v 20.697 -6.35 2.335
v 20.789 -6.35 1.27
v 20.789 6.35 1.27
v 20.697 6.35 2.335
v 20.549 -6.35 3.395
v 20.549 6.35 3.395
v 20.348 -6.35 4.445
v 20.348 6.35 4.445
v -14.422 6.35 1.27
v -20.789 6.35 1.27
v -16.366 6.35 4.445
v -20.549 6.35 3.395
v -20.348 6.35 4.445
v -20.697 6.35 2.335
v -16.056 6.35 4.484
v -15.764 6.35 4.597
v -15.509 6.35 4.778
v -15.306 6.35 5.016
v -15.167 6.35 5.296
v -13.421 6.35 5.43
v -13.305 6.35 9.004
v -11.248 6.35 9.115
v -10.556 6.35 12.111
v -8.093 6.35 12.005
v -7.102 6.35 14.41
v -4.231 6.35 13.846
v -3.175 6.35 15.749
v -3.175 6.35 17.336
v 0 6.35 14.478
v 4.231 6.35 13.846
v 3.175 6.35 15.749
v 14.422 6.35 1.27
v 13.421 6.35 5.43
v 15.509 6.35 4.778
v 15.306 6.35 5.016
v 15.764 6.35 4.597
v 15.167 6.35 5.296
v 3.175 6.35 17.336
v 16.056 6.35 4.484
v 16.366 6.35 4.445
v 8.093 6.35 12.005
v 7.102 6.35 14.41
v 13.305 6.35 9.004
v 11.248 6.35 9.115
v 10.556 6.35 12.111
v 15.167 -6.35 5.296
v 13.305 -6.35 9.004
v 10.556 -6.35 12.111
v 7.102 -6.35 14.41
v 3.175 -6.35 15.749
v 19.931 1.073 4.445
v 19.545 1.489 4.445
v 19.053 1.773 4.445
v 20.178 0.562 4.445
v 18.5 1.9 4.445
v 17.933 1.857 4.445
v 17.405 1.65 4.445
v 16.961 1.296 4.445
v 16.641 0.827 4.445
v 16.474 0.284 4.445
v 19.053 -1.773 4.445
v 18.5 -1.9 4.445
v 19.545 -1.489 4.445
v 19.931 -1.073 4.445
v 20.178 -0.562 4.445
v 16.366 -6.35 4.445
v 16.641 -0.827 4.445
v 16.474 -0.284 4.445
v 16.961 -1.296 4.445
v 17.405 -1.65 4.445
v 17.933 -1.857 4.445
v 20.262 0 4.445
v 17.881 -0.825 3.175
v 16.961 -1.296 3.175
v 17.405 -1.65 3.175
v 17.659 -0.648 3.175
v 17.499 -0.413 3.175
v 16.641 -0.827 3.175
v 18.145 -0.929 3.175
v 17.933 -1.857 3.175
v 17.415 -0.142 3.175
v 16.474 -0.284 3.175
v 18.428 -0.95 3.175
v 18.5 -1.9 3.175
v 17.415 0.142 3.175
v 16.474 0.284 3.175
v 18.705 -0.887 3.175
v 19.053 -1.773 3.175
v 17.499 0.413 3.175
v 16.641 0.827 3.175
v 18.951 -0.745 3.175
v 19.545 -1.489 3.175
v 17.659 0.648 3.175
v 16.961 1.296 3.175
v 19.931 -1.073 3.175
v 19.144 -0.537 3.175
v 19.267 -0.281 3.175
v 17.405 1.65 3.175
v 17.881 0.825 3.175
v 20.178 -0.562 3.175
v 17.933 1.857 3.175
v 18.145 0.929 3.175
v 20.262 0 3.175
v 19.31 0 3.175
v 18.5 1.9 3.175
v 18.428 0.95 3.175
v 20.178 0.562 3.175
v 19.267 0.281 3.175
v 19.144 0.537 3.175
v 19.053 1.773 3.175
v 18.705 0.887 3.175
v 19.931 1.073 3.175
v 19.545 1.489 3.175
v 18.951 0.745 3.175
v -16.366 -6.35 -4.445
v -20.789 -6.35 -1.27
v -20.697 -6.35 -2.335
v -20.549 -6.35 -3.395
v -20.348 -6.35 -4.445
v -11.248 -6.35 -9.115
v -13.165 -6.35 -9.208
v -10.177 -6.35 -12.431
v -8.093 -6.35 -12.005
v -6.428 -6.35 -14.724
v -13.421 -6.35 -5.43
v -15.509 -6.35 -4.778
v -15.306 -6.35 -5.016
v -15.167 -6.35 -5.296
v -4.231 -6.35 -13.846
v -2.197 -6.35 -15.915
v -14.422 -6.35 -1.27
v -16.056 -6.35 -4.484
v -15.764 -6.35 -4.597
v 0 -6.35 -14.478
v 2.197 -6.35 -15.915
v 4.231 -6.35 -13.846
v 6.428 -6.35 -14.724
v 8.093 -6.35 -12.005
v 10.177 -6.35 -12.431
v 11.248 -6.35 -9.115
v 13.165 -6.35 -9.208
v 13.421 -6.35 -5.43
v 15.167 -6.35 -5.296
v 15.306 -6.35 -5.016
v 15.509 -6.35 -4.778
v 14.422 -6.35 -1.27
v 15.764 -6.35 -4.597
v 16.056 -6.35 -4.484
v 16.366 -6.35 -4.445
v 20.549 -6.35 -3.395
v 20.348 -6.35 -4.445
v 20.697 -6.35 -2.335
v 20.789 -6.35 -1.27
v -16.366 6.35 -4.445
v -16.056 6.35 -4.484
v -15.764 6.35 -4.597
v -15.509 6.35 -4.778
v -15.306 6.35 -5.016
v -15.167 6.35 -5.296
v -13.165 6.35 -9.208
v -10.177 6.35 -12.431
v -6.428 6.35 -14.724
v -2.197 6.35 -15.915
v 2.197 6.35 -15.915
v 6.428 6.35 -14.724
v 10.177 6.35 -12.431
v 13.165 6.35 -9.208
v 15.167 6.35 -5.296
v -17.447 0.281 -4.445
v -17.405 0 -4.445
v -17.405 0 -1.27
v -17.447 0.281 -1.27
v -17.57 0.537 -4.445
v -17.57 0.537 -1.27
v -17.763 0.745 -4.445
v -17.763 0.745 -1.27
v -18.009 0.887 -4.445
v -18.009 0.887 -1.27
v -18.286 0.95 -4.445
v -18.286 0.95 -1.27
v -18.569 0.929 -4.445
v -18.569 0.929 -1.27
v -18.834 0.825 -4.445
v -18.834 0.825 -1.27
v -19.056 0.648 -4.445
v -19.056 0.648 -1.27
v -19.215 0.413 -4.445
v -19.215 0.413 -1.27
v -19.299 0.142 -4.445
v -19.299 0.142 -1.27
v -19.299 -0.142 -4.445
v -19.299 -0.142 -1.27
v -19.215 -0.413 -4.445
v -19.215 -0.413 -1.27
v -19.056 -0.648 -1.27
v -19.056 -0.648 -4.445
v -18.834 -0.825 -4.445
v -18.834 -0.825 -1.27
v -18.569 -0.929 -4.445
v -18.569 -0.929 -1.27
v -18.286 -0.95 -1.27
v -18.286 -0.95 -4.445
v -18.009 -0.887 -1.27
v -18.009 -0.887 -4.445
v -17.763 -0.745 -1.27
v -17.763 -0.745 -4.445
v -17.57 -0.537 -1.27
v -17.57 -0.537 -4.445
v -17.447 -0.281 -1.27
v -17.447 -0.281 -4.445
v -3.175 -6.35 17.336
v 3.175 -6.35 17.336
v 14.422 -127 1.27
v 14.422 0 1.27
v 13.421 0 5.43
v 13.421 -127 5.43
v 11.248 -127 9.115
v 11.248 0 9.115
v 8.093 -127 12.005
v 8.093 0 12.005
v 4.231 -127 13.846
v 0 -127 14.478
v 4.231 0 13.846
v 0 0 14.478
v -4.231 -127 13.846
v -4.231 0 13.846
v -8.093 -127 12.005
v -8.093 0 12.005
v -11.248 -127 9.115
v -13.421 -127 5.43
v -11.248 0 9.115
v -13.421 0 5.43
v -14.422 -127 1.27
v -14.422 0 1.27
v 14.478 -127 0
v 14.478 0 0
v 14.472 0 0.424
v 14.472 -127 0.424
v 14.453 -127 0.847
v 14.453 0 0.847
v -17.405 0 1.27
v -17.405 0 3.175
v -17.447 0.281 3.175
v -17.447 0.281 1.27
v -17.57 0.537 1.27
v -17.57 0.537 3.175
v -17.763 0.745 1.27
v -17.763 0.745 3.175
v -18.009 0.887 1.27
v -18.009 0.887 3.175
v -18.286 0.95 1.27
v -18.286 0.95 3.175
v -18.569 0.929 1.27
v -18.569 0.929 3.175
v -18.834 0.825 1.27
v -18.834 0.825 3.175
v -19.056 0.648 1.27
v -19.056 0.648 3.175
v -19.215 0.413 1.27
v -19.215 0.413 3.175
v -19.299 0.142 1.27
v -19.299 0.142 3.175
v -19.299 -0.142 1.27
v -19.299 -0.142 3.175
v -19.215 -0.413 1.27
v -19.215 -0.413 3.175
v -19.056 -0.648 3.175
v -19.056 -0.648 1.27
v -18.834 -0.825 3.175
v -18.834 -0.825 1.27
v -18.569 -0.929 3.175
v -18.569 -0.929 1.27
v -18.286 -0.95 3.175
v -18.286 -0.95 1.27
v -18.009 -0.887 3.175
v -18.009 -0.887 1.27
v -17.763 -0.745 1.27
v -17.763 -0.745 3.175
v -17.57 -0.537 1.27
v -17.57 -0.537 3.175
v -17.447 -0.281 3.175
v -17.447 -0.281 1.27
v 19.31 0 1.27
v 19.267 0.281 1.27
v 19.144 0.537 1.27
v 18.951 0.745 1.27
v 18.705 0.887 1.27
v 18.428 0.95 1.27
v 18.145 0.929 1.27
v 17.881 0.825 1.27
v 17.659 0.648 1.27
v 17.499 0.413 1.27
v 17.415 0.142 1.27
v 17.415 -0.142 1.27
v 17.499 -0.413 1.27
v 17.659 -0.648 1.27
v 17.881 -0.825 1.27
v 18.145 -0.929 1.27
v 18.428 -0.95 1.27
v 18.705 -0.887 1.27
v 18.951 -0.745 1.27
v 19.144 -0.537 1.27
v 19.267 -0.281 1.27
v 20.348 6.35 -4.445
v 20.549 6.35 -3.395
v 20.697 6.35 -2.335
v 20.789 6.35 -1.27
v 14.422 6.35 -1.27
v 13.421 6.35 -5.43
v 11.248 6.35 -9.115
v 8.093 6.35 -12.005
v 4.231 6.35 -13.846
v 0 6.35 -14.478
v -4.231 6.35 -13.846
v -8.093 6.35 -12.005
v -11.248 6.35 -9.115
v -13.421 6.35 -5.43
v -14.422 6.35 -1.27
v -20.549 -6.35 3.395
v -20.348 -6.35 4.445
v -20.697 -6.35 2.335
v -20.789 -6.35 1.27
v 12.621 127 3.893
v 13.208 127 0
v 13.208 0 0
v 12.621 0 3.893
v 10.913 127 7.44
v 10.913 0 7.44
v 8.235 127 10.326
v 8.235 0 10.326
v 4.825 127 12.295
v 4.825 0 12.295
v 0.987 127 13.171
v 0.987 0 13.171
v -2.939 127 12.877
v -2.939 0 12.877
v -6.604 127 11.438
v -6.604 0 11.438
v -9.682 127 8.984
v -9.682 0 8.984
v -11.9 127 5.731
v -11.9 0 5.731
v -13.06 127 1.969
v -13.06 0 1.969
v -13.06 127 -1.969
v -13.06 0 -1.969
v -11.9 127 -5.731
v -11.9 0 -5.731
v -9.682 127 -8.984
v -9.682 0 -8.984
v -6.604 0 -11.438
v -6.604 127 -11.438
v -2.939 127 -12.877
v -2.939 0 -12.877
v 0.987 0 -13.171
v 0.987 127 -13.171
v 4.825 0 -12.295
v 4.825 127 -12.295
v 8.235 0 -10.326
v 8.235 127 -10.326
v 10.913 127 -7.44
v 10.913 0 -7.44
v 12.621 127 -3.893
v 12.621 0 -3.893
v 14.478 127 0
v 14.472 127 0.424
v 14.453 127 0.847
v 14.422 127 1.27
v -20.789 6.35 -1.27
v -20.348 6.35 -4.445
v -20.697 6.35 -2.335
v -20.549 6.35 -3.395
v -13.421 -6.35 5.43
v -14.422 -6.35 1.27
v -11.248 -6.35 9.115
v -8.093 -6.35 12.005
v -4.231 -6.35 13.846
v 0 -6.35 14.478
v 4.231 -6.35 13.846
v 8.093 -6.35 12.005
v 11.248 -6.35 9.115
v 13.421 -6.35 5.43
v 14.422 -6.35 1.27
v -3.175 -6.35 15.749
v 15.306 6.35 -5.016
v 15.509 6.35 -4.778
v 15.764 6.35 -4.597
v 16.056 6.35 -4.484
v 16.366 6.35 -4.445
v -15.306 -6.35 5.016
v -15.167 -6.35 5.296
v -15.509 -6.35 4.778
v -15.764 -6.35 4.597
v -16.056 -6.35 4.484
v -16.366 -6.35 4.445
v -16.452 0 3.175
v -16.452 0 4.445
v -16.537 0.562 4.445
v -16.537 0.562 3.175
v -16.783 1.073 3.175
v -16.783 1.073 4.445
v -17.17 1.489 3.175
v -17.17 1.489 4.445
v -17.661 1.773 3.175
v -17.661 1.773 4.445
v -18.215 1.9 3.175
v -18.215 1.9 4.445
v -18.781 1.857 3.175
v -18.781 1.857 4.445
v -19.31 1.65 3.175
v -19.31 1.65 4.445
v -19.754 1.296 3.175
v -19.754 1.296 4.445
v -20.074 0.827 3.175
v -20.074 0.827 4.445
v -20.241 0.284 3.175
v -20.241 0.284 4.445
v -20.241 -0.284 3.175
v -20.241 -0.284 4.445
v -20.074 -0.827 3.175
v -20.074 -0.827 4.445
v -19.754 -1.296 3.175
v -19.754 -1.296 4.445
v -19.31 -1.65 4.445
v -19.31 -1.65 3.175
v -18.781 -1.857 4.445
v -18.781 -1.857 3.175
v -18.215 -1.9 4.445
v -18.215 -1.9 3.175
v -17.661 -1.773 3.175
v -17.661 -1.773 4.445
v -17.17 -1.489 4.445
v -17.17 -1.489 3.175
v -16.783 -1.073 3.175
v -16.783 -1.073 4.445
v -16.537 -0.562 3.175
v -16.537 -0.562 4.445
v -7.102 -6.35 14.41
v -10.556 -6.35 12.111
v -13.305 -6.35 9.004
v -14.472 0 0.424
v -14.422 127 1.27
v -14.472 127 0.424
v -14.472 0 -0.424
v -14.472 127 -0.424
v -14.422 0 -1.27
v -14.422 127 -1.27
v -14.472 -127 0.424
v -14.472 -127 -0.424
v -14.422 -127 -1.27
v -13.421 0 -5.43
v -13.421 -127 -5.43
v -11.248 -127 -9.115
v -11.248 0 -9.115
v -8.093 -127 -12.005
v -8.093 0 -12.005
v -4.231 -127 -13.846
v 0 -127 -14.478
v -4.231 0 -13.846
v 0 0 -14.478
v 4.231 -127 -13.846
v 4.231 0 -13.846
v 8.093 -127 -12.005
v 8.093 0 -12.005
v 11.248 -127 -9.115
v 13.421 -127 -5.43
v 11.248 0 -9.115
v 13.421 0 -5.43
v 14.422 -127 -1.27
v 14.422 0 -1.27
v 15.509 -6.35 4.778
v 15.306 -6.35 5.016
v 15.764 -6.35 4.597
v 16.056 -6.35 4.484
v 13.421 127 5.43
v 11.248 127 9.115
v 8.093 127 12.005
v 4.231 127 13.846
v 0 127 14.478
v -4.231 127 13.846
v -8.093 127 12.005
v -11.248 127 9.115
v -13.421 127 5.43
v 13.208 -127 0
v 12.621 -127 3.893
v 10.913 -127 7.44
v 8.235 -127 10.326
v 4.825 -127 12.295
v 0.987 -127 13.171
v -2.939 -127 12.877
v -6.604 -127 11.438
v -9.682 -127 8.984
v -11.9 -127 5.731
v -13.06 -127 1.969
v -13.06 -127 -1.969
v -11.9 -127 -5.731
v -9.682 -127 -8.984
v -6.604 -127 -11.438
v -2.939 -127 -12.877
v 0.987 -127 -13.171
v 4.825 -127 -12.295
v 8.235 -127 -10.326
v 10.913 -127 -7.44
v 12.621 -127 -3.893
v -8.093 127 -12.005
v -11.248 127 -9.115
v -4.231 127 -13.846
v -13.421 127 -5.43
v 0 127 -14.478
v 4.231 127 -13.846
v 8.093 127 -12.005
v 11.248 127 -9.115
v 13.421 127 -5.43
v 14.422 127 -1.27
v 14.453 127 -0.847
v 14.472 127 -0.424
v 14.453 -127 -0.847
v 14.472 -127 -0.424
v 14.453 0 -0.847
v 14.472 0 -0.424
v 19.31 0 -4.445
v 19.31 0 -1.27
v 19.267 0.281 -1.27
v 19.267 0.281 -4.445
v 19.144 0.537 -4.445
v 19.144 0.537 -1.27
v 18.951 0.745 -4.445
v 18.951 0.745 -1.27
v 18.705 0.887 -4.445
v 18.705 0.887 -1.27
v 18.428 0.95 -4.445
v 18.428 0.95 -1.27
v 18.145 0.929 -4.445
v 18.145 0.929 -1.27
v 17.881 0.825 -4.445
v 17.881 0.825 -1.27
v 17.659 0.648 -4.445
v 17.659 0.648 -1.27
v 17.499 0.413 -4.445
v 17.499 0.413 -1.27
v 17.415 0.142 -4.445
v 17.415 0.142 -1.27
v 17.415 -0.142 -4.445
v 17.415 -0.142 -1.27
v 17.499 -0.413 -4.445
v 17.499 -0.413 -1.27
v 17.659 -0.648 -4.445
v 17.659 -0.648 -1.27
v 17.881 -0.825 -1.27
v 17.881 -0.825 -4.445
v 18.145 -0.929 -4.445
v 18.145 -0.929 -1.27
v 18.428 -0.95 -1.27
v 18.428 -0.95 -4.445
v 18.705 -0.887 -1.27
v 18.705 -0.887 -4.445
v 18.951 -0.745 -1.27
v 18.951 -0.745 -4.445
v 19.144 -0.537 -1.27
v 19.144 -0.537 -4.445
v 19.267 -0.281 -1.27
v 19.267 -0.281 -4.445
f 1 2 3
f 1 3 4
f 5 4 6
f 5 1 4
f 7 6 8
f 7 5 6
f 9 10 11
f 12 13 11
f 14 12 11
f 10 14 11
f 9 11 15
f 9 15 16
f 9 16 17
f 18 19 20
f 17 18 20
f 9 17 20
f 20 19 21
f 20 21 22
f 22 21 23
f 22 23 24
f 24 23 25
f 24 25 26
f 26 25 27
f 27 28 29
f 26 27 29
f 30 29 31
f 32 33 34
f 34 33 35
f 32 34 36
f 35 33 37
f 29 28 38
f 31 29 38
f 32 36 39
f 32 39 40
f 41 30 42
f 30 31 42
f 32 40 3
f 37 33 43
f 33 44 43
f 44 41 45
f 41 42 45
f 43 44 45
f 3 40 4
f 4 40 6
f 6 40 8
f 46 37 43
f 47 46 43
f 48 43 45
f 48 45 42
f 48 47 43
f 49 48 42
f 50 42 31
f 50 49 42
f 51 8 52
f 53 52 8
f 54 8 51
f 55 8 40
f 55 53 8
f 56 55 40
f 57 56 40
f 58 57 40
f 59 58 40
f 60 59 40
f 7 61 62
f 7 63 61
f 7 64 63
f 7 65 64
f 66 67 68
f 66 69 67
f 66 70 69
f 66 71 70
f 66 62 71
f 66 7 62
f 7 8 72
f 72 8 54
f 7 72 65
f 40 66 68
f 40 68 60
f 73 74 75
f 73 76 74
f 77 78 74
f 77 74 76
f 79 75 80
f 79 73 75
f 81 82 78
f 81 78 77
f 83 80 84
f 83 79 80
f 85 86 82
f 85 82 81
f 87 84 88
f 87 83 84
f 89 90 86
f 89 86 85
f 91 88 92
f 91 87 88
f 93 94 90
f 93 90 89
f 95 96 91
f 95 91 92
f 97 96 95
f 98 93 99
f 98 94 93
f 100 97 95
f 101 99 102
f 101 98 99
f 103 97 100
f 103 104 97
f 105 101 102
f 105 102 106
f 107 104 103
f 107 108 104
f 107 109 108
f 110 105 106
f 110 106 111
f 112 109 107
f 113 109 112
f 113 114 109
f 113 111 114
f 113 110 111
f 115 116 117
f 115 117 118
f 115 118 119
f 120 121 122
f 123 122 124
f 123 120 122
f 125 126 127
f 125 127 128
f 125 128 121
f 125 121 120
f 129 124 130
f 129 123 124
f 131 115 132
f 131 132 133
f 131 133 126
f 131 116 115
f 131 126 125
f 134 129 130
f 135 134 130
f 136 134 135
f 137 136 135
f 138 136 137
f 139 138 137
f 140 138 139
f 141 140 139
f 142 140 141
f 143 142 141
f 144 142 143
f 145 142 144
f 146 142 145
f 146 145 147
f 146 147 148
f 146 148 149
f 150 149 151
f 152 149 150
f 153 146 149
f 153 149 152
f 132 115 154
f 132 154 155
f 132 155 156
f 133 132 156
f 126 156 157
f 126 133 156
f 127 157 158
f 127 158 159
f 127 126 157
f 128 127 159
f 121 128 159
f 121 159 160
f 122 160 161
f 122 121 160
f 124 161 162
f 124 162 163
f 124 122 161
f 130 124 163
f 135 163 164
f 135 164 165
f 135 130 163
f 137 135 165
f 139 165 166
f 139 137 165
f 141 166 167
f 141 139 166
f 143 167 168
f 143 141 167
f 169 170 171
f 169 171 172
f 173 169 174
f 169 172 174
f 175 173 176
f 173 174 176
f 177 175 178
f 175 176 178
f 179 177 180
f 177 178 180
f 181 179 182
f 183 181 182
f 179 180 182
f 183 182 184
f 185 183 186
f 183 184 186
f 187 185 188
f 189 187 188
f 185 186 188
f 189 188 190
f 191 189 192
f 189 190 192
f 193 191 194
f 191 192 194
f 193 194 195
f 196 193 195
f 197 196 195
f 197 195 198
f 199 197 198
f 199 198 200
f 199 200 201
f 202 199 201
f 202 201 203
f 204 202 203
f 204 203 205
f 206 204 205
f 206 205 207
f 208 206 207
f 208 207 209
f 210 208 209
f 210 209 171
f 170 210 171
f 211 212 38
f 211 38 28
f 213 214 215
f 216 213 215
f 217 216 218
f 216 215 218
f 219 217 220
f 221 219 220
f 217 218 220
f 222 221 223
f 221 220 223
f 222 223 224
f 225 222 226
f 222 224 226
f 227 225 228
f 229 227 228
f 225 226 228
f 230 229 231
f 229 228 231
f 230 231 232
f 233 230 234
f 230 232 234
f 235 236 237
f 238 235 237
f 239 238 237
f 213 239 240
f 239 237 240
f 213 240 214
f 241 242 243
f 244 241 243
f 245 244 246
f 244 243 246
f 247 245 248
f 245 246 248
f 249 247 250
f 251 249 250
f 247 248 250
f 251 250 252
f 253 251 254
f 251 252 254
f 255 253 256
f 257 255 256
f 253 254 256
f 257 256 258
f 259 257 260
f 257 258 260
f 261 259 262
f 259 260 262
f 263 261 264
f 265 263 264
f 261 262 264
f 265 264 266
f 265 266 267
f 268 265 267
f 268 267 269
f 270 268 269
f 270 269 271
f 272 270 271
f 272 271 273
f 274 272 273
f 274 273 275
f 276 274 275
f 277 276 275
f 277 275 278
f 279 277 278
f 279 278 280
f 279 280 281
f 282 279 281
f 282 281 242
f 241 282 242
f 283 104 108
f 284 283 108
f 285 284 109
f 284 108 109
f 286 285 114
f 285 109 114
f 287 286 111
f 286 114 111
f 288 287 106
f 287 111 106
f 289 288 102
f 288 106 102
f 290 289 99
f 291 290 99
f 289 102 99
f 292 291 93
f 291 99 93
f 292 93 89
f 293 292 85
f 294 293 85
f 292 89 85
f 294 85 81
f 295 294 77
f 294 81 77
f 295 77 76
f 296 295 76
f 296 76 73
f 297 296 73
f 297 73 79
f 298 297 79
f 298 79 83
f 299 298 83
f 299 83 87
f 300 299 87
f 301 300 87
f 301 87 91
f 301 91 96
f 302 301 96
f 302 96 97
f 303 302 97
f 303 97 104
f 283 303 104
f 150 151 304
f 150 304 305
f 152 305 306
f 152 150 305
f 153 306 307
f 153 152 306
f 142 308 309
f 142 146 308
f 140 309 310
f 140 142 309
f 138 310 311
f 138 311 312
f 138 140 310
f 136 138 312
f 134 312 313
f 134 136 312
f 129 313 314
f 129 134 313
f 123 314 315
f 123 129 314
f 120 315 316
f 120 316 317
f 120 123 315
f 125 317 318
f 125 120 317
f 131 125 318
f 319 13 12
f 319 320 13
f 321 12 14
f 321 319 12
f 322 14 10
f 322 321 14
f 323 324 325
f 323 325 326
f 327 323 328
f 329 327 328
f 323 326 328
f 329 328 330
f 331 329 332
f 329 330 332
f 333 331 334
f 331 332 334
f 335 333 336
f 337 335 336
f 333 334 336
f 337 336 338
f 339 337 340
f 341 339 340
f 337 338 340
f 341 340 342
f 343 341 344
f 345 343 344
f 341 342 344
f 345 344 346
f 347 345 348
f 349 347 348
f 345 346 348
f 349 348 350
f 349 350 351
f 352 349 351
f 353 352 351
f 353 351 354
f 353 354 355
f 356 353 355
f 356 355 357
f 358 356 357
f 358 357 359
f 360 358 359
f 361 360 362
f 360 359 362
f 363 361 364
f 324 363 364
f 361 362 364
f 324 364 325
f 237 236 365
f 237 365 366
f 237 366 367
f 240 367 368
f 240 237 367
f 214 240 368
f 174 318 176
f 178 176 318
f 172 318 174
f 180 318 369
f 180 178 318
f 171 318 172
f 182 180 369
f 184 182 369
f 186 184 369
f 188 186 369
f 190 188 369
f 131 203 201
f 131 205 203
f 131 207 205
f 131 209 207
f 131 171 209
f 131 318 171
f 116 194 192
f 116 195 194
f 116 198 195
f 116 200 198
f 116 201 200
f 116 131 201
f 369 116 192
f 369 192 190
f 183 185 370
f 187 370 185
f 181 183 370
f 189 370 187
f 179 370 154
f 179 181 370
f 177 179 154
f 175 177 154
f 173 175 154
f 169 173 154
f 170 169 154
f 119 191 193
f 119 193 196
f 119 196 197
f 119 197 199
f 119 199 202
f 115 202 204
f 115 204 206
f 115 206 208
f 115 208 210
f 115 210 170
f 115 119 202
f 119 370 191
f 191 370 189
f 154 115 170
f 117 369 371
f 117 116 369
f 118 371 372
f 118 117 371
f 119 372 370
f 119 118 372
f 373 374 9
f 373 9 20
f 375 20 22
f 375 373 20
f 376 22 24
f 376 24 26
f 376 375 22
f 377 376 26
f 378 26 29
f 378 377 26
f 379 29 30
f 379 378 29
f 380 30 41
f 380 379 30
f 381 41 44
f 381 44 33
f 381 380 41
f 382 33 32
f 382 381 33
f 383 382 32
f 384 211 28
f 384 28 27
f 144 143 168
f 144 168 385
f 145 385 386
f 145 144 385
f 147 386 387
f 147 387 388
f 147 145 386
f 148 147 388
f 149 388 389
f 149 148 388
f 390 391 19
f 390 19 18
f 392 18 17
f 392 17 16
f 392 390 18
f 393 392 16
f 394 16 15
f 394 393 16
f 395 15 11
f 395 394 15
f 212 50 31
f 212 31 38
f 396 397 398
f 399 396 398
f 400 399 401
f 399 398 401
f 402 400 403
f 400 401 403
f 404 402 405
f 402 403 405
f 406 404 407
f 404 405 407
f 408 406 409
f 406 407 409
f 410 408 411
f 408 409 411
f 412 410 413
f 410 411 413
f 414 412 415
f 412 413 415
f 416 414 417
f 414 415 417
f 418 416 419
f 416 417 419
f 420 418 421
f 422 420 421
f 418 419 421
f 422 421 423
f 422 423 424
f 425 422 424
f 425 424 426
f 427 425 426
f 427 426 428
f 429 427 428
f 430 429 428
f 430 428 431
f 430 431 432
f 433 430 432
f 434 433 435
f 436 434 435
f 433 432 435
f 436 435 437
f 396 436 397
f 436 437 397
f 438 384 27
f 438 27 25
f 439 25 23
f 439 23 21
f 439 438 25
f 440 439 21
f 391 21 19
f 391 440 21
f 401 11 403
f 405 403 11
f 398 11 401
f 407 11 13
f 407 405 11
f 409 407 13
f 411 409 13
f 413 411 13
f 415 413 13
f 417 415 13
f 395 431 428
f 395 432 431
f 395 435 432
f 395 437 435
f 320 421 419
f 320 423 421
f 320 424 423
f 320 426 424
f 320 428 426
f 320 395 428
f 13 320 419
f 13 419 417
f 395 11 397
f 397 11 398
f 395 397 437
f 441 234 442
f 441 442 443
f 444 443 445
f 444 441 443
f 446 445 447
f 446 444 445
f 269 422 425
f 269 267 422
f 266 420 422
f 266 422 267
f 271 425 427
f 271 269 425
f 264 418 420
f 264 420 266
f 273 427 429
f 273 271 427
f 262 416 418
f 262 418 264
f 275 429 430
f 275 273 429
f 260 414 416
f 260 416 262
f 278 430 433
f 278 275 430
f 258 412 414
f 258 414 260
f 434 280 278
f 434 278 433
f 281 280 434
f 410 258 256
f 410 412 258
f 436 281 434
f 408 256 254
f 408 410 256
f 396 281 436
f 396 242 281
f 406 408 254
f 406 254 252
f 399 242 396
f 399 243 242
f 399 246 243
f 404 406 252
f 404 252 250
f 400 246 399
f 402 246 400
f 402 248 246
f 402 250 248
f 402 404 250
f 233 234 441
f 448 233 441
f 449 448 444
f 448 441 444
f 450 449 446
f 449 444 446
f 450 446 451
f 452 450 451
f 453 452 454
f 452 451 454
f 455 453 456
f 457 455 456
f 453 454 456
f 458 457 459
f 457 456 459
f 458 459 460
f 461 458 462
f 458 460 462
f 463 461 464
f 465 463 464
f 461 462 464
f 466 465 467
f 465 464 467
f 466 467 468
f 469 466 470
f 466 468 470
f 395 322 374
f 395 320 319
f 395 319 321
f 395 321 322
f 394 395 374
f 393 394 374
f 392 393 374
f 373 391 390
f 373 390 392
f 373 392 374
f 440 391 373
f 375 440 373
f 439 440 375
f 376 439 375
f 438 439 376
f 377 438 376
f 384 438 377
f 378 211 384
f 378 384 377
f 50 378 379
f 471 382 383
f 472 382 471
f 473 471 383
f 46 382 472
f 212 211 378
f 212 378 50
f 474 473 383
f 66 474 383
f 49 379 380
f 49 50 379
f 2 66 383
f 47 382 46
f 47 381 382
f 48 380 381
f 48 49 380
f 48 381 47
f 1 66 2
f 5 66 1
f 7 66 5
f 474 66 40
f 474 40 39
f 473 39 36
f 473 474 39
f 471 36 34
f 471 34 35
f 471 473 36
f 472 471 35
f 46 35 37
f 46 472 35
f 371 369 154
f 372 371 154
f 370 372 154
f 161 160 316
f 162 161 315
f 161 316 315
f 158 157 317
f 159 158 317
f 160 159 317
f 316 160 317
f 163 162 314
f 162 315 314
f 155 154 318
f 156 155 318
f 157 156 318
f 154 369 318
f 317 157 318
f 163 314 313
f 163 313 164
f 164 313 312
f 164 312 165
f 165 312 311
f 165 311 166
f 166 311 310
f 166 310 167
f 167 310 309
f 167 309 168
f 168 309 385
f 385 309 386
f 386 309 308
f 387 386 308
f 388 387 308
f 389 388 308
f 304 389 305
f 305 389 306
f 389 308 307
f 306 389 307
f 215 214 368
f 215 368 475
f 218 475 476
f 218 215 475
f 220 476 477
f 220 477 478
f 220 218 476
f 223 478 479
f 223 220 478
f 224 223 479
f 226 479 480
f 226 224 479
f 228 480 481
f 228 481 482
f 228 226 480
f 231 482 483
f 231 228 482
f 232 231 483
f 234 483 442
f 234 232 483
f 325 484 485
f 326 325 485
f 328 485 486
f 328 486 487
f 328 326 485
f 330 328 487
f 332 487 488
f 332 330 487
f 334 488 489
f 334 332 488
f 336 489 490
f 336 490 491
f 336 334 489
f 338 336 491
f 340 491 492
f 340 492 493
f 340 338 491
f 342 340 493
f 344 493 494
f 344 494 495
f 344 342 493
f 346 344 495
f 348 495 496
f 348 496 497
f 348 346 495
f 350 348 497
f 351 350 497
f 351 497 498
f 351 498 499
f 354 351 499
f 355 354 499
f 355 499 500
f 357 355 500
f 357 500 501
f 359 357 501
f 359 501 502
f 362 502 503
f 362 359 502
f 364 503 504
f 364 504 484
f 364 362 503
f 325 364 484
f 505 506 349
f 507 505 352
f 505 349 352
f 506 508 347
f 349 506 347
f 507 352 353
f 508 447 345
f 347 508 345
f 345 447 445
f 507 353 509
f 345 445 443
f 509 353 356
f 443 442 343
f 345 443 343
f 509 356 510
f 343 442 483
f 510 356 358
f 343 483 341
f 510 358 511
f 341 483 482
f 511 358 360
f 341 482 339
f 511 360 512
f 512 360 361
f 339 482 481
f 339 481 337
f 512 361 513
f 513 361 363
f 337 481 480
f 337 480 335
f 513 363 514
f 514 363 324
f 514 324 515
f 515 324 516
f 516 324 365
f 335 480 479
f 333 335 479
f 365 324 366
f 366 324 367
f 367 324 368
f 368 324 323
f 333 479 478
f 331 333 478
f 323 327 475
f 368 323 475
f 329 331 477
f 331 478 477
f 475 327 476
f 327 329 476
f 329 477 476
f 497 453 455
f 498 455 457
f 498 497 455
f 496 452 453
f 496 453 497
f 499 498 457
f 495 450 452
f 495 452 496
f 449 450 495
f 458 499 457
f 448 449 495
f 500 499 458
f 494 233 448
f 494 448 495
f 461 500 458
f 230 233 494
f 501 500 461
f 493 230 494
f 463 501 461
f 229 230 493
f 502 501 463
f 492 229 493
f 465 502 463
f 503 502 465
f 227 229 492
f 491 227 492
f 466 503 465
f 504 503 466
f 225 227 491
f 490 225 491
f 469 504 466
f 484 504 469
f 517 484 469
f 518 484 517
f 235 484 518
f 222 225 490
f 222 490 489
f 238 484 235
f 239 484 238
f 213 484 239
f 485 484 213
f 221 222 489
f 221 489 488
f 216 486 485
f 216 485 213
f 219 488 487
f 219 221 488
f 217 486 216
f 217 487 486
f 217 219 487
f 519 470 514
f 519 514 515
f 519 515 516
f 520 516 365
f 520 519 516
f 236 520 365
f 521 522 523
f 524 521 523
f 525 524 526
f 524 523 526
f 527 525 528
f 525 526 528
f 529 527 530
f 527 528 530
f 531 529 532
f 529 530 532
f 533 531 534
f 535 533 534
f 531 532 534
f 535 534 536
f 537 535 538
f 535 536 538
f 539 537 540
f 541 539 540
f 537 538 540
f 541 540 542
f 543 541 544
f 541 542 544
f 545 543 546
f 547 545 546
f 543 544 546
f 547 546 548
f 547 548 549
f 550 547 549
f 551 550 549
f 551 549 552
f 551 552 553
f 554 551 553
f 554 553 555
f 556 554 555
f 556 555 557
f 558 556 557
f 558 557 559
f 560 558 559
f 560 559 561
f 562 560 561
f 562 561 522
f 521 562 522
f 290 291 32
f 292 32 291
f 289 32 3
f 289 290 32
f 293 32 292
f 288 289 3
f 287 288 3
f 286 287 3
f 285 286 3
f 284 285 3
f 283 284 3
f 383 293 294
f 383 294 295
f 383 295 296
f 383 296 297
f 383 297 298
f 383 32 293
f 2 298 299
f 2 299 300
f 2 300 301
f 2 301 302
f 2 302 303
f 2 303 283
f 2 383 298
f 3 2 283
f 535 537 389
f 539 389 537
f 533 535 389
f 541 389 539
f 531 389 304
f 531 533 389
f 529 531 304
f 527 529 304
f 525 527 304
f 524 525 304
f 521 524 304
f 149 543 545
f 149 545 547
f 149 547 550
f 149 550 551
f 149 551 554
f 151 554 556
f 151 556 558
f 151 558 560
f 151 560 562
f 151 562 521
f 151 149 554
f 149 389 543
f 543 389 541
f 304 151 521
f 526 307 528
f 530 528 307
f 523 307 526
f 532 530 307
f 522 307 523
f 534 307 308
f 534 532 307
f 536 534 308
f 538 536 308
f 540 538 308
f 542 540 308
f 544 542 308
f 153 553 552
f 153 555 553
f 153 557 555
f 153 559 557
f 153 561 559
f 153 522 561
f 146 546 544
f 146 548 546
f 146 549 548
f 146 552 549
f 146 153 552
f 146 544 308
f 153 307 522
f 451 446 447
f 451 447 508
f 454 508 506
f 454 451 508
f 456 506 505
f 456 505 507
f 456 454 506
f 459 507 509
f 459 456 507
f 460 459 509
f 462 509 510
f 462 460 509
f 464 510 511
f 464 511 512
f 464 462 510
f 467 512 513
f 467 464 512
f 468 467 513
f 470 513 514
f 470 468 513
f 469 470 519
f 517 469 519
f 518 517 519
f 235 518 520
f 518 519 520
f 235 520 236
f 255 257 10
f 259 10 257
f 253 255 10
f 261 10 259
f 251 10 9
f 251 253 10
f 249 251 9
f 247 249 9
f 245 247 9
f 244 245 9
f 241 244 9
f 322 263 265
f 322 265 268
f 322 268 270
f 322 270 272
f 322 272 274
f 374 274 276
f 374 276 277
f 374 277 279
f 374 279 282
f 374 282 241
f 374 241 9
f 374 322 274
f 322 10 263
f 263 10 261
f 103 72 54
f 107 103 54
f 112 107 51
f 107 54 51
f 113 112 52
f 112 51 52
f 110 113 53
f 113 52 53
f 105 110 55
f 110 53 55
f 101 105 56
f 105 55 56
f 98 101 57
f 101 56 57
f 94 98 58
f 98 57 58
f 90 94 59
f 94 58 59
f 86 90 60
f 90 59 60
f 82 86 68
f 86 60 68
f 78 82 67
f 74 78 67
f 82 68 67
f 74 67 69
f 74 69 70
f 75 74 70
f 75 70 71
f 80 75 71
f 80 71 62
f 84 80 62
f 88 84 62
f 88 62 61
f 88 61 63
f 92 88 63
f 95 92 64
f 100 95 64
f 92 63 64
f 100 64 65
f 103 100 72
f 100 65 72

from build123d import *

# Parameters (mm, degrees)
F0_R     = 13.208
F1_DEPTH = 127
F2_DEPTH = 6.35
F3_R     = 0.9525
F4_R     = 0.9525
F5_DEPTH = 25.4
F3_R_2   = 1.905
F4_R_2   = 1.905
F6_DEPTH = 1.27


with BuildPart() as f1:
    # F0 (on Front) → F1 (new body, symmetric)
    with BuildSketch(Plane.XZ):
        with BuildLine():
            ThreePointArc((14.4221906796, -1.27), (14.4640409406, -0.6356128303), (14.478, 0))
            ThreePointArc((14.478, 0), (14.4640409406, 0.6356128303), (14.4221906796, 1.27))
            ThreePointArc((14.4221906796, 1.27), (0, 14.478), (-14.4221906796, 1.27))
            ThreePointArc((-14.4221906796, 1.27), (-14.478, 0), (-14.4221906796, -1.27))
            ThreePointArc((-14.4221906796, -1.27), (0, -14.478), (14.4221906796, -1.27))
        make_face()
        Circle(F0_R, mode=Mode.SUBTRACT)
    extrude(amount=F1_DEPTH, both=True)


with BuildPart() as f2:
    # F0 (on Front) → F2 (new body, symmetric)
    with BuildSketch(Plane.XZ):
        with BuildLine():
            Line((-20.7892444307, 1.27), (-16.0152237028, 1.27))
            ThreePointArc((-16.0152237028, 1.27), (-15.8067006229, 2.8720211817), (-15.4383375157, 4.445))
            Line((-15.4383375157, 4.445), (-16.3663781959, 4.445))
            Line((-16.3663781959, 4.445), (-20.3481586145, 4.445))
            ThreePointArc((-20.3481586145, 4.445), (-20.6298724808, 2.865998155), (-20.7892444307, 1.27))
        make_face()
        with BuildLine():
            Line((-16.0152237028, 1.27), (-15.4383375157, 1.27))
            Line((-15.4383375157, 1.27), (-15.4383375157, 4.445))
            ThreePointArc((-15.4383375157, 4.445), (-15.8067006229, 2.8720211817), (-16.0152237028, 1.27))
        make_face()
        with BuildLine():
            Line((-16.3663781959, 4.445), (-15.4383375157, 4.445))
            ThreePointArc((-15.4383375157, 4.445), (-15.3087756792, 4.8725432223), (-15.1673761286, 5.2963186859))
            ThreePointArc((-15.1673761286, 5.2963186859), (-15.63113173, 4.679474706), (-16.3663781959, 4.445))
        make_face()
        with BuildLine():
            ThreePointArc((-14.4221906796, 1.27), (0, 14.478), (14.4221906796, 1.27))
            Line((14.4221906796, 1.27), (15.4383375157, 1.27))
            Line((15.4383375157, 1.27), (15.4383375157, 4.445))
            ThreePointArc((15.4383375157, 4.445), (15.3087756893, 4.8725431908), (15.1673761504, 5.2963186234))
            ThreePointArc((15.1673761504, 5.2963186234), (10.5557305202, 12.1110215686), (3.175, 15.748640108))
            Line((3.175, 15.748640108), (3.175, 14.7955))
            Line((3.175, 14.7955), (-3.175, 14.7955))
            Line((-3.175, 14.7955), (-3.175, 15.748640108))
            ThreePointArc((-3.175, 15.748640108), (-10.5557304953, 12.1110215903), (-15.1673761286, 5.2963186859))
            ThreePointArc((-15.1673761286, 5.2963186859), (-15.3087756792, 4.8725432223), (-15.4383375157, 4.445))
            Line((-15.4383375157, 4.445), (-15.4383375157, 1.27))
            Line((-15.4383375157, 1.27), (-14.4221906796, 1.27))
        make_face()
        with BuildLine():
            Line((15.4383375157, 4.445), (15.4383375157, 1.27))
            Line((15.4383375157, 1.27), (16.0152237028, 1.27))
            ThreePointArc((16.0152237028, 1.27), (15.8067006229, 2.8720211817), (15.4383375157, 4.445))
        make_face()
        with BuildLine():
            ThreePointArc((15.4383375157, 4.445), (15.8067006229, 2.8720211817), (16.0152237028, 1.27))
            Line((16.0152237028, 1.27), (20.7892444307, 1.27))
            ThreePointArc((20.7892444307, 1.27), (20.6298724808, 2.865998155), (20.3481586145, 4.445))
            Line((20.3481586145, 4.445), (16.3663781959, 4.445))
            Line((16.3663781959, 4.445), (15.4383375157, 4.445))
        make_face()
        with BuildLine():
            ThreePointArc((15.1673761504, 5.2963186234), (15.3087756893, 4.8725431908), (15.4383375157, 4.445))
            Line((15.4383375157, 4.445), (16.3663781959, 4.445))
            ThreePointArc((16.3663781959, 4.445), (15.631131757, 4.6794746869), (15.1673761504, 5.2963186234))
        make_face()
        with BuildLine():
            Line((3.175, 14.7955), (3.175, 15.748640108))
            ThreePointArc((3.175, 15.748640108), (0, 16.0655), (-3.175, 15.748640108))
            Line((-3.175, 15.748640108), (-3.175, 14.7955))
            Line((-3.175, 14.7955), (3.175, 14.7955))
        make_face()
        with BuildLine():
            ThreePointArc((-3.175, 15.748640108), (0, 16.0655), (3.175, 15.748640108))
            Line((3.175, 15.748640108), (3.175, 17.3355))
            Line((3.175, 17.3355), (-3.175, 17.3355))
            Line((-3.175, 17.3355), (-3.175, 15.748640108))
        make_face()
    extrude(amount=F2_DEPTH, both=True)


with BuildPart() as f2b:
    # F0 (on Front) → F2, piece 2 (new body, symmetric)
    with BuildSketch(Plane.XZ):
        with BuildLine():
            Line((-15.4383375157, -4.445), (-15.4383375157, -1.27))
            Line((-15.4383375157, -1.27), (-16.0152237028, -1.27))
            ThreePointArc((-16.0152237028, -1.27), (-15.8067006229, -2.8720211817), (-15.4383375157, -4.445))
        make_face()
        with BuildLine():
            Line((-16.3663781959, -4.445), (-15.4383375157, -4.445))
            ThreePointArc((-15.4383375157, -4.445), (-15.8067006229, -2.8720211817), (-16.0152237028, -1.27))
            Line((-16.0152237028, -1.27), (-20.7892444307, -1.27))
            ThreePointArc((-20.7892444307, -1.27), (-20.6298724808, -2.865998155), (-20.3481586145, -4.445))
            Line((-20.3481586145, -4.445), (-16.3663781959, -4.445))
        make_face()
        with BuildLine():
            ThreePointArc((-15.1673761347, -5.2963186686), (-15.308775682, -4.8725432136), (-15.4383375157, -4.445))
            Line((-15.4383375157, -4.445), (-16.3663781959, -4.445))
            ThreePointArc((-16.3663781959, -4.445), (-15.6311317375, -4.6794747007), (-15.1673761347, -5.2963186686))
        make_face()
        with BuildLine():
            Line((16.3663781959, -4.445), (15.4383375157, -4.445))
            ThreePointArc((15.4383375157, -4.445), (15.3087756903, -4.8725431875), (15.1673761527, -5.2963186169))
            ThreePointArc((15.1673761527, -5.2963186169), (15.6311317598, -4.6794746849), (16.3663781959, -4.445))
        make_face()
        with BuildLine():
            Line((16.0152237028, -1.27), (15.4383375157, -1.27))
            Line((15.4383375157, -1.27), (15.4383375157, -4.445))
            ThreePointArc((15.4383375157, -4.445), (15.8067006229, -2.8720211817), (16.0152237028, -1.27))
        make_face()
        with BuildLine():
            ThreePointArc((16.0152237028, -1.27), (15.8067006229, -2.8720211817), (15.4383375157, -4.445))
            Line((15.4383375157, -4.445), (16.3663781959, -4.445))
            Line((16.3663781959, -4.445), (20.3481586145, -4.445))
            ThreePointArc((20.3481586145, -4.445), (20.6298724808, -2.865998155), (20.7892444307, -1.27))
            Line((20.7892444307, -1.27), (16.0152237028, -1.27))
        make_face()
        with BuildLine():
            Line((15.4383375157, -1.27), (14.4221906796, -1.27))
            ThreePointArc((14.4221906796, -1.27), (0, -14.478), (-14.4221906796, -1.27))
            Line((-14.4221906796, -1.27), (-15.4383375157, -1.27))
            Line((-15.4383375157, -1.27), (-15.4383375157, -4.445))
            ThreePointArc((-15.4383375157, -4.445), (-15.308775682, -4.8725432136), (-15.1673761347, -5.2963186686))
            ThreePointArc((-15.1673761347, -5.2963186686), (2.74e-08, -16.0655), (15.1673761527, -5.2963186169))
            ThreePointArc((15.1673761527, -5.2963186169), (15.3087756903, -4.8725431875), (15.4383375157, -4.445))
            Line((15.4383375157, -4.445), (15.4383375157, -1.27))
        make_face()
    extrude(amount=F2_DEPTH, both=True)


with BuildPart() as f5_tool:
    # F3 (on face) + F4 (on face) → F5 (new body)
    with BuildSketch(Plane.XY.offset(4.445)):
        with Locations((18.3572684052, 0)):
            Circle(F3_R)
    with BuildSketch(Plane.XY.offset(4.445)):
        with Locations((-18.3572684052, 0)):
            Circle(F4_R)
    extrude(amount=-F5_DEPTH)


with BuildPart() as f2_1:
    add(f2.part)

    # F5: cut by f5_tool
    add(f5_tool.part, mode=Mode.SUBTRACT)

    # F3 (on face) + F4 (on face) → F6 (cut)
    with BuildSketch(Plane.XY.offset(4.445)):
        with Locations((18.3572684052, 0)):
            Circle(F3_R_2)
        with Locations((18.3572684052, 0)):
            Circle(F3_R, mode=Mode.SUBTRACT)
    with BuildSketch(Plane.XY.offset(4.445)):
        with Locations((-18.3572684052, 0)):
            Circle(F4_R_2)
        with Locations((-18.3572684052, 0)):
            Circle(F4_R, mode=Mode.SUBTRACT)
    extrude(amount=-F6_DEPTH, mode=Mode.SUBTRACT)


with BuildPart() as f2b_1:
    add(f2b.part)

    # F5: cut by f5_tool
    add(f5_tool.part, mode=Mode.SUBTRACT)


solid = Compound([f1.part, f2_1.part, f2b_1.part])
